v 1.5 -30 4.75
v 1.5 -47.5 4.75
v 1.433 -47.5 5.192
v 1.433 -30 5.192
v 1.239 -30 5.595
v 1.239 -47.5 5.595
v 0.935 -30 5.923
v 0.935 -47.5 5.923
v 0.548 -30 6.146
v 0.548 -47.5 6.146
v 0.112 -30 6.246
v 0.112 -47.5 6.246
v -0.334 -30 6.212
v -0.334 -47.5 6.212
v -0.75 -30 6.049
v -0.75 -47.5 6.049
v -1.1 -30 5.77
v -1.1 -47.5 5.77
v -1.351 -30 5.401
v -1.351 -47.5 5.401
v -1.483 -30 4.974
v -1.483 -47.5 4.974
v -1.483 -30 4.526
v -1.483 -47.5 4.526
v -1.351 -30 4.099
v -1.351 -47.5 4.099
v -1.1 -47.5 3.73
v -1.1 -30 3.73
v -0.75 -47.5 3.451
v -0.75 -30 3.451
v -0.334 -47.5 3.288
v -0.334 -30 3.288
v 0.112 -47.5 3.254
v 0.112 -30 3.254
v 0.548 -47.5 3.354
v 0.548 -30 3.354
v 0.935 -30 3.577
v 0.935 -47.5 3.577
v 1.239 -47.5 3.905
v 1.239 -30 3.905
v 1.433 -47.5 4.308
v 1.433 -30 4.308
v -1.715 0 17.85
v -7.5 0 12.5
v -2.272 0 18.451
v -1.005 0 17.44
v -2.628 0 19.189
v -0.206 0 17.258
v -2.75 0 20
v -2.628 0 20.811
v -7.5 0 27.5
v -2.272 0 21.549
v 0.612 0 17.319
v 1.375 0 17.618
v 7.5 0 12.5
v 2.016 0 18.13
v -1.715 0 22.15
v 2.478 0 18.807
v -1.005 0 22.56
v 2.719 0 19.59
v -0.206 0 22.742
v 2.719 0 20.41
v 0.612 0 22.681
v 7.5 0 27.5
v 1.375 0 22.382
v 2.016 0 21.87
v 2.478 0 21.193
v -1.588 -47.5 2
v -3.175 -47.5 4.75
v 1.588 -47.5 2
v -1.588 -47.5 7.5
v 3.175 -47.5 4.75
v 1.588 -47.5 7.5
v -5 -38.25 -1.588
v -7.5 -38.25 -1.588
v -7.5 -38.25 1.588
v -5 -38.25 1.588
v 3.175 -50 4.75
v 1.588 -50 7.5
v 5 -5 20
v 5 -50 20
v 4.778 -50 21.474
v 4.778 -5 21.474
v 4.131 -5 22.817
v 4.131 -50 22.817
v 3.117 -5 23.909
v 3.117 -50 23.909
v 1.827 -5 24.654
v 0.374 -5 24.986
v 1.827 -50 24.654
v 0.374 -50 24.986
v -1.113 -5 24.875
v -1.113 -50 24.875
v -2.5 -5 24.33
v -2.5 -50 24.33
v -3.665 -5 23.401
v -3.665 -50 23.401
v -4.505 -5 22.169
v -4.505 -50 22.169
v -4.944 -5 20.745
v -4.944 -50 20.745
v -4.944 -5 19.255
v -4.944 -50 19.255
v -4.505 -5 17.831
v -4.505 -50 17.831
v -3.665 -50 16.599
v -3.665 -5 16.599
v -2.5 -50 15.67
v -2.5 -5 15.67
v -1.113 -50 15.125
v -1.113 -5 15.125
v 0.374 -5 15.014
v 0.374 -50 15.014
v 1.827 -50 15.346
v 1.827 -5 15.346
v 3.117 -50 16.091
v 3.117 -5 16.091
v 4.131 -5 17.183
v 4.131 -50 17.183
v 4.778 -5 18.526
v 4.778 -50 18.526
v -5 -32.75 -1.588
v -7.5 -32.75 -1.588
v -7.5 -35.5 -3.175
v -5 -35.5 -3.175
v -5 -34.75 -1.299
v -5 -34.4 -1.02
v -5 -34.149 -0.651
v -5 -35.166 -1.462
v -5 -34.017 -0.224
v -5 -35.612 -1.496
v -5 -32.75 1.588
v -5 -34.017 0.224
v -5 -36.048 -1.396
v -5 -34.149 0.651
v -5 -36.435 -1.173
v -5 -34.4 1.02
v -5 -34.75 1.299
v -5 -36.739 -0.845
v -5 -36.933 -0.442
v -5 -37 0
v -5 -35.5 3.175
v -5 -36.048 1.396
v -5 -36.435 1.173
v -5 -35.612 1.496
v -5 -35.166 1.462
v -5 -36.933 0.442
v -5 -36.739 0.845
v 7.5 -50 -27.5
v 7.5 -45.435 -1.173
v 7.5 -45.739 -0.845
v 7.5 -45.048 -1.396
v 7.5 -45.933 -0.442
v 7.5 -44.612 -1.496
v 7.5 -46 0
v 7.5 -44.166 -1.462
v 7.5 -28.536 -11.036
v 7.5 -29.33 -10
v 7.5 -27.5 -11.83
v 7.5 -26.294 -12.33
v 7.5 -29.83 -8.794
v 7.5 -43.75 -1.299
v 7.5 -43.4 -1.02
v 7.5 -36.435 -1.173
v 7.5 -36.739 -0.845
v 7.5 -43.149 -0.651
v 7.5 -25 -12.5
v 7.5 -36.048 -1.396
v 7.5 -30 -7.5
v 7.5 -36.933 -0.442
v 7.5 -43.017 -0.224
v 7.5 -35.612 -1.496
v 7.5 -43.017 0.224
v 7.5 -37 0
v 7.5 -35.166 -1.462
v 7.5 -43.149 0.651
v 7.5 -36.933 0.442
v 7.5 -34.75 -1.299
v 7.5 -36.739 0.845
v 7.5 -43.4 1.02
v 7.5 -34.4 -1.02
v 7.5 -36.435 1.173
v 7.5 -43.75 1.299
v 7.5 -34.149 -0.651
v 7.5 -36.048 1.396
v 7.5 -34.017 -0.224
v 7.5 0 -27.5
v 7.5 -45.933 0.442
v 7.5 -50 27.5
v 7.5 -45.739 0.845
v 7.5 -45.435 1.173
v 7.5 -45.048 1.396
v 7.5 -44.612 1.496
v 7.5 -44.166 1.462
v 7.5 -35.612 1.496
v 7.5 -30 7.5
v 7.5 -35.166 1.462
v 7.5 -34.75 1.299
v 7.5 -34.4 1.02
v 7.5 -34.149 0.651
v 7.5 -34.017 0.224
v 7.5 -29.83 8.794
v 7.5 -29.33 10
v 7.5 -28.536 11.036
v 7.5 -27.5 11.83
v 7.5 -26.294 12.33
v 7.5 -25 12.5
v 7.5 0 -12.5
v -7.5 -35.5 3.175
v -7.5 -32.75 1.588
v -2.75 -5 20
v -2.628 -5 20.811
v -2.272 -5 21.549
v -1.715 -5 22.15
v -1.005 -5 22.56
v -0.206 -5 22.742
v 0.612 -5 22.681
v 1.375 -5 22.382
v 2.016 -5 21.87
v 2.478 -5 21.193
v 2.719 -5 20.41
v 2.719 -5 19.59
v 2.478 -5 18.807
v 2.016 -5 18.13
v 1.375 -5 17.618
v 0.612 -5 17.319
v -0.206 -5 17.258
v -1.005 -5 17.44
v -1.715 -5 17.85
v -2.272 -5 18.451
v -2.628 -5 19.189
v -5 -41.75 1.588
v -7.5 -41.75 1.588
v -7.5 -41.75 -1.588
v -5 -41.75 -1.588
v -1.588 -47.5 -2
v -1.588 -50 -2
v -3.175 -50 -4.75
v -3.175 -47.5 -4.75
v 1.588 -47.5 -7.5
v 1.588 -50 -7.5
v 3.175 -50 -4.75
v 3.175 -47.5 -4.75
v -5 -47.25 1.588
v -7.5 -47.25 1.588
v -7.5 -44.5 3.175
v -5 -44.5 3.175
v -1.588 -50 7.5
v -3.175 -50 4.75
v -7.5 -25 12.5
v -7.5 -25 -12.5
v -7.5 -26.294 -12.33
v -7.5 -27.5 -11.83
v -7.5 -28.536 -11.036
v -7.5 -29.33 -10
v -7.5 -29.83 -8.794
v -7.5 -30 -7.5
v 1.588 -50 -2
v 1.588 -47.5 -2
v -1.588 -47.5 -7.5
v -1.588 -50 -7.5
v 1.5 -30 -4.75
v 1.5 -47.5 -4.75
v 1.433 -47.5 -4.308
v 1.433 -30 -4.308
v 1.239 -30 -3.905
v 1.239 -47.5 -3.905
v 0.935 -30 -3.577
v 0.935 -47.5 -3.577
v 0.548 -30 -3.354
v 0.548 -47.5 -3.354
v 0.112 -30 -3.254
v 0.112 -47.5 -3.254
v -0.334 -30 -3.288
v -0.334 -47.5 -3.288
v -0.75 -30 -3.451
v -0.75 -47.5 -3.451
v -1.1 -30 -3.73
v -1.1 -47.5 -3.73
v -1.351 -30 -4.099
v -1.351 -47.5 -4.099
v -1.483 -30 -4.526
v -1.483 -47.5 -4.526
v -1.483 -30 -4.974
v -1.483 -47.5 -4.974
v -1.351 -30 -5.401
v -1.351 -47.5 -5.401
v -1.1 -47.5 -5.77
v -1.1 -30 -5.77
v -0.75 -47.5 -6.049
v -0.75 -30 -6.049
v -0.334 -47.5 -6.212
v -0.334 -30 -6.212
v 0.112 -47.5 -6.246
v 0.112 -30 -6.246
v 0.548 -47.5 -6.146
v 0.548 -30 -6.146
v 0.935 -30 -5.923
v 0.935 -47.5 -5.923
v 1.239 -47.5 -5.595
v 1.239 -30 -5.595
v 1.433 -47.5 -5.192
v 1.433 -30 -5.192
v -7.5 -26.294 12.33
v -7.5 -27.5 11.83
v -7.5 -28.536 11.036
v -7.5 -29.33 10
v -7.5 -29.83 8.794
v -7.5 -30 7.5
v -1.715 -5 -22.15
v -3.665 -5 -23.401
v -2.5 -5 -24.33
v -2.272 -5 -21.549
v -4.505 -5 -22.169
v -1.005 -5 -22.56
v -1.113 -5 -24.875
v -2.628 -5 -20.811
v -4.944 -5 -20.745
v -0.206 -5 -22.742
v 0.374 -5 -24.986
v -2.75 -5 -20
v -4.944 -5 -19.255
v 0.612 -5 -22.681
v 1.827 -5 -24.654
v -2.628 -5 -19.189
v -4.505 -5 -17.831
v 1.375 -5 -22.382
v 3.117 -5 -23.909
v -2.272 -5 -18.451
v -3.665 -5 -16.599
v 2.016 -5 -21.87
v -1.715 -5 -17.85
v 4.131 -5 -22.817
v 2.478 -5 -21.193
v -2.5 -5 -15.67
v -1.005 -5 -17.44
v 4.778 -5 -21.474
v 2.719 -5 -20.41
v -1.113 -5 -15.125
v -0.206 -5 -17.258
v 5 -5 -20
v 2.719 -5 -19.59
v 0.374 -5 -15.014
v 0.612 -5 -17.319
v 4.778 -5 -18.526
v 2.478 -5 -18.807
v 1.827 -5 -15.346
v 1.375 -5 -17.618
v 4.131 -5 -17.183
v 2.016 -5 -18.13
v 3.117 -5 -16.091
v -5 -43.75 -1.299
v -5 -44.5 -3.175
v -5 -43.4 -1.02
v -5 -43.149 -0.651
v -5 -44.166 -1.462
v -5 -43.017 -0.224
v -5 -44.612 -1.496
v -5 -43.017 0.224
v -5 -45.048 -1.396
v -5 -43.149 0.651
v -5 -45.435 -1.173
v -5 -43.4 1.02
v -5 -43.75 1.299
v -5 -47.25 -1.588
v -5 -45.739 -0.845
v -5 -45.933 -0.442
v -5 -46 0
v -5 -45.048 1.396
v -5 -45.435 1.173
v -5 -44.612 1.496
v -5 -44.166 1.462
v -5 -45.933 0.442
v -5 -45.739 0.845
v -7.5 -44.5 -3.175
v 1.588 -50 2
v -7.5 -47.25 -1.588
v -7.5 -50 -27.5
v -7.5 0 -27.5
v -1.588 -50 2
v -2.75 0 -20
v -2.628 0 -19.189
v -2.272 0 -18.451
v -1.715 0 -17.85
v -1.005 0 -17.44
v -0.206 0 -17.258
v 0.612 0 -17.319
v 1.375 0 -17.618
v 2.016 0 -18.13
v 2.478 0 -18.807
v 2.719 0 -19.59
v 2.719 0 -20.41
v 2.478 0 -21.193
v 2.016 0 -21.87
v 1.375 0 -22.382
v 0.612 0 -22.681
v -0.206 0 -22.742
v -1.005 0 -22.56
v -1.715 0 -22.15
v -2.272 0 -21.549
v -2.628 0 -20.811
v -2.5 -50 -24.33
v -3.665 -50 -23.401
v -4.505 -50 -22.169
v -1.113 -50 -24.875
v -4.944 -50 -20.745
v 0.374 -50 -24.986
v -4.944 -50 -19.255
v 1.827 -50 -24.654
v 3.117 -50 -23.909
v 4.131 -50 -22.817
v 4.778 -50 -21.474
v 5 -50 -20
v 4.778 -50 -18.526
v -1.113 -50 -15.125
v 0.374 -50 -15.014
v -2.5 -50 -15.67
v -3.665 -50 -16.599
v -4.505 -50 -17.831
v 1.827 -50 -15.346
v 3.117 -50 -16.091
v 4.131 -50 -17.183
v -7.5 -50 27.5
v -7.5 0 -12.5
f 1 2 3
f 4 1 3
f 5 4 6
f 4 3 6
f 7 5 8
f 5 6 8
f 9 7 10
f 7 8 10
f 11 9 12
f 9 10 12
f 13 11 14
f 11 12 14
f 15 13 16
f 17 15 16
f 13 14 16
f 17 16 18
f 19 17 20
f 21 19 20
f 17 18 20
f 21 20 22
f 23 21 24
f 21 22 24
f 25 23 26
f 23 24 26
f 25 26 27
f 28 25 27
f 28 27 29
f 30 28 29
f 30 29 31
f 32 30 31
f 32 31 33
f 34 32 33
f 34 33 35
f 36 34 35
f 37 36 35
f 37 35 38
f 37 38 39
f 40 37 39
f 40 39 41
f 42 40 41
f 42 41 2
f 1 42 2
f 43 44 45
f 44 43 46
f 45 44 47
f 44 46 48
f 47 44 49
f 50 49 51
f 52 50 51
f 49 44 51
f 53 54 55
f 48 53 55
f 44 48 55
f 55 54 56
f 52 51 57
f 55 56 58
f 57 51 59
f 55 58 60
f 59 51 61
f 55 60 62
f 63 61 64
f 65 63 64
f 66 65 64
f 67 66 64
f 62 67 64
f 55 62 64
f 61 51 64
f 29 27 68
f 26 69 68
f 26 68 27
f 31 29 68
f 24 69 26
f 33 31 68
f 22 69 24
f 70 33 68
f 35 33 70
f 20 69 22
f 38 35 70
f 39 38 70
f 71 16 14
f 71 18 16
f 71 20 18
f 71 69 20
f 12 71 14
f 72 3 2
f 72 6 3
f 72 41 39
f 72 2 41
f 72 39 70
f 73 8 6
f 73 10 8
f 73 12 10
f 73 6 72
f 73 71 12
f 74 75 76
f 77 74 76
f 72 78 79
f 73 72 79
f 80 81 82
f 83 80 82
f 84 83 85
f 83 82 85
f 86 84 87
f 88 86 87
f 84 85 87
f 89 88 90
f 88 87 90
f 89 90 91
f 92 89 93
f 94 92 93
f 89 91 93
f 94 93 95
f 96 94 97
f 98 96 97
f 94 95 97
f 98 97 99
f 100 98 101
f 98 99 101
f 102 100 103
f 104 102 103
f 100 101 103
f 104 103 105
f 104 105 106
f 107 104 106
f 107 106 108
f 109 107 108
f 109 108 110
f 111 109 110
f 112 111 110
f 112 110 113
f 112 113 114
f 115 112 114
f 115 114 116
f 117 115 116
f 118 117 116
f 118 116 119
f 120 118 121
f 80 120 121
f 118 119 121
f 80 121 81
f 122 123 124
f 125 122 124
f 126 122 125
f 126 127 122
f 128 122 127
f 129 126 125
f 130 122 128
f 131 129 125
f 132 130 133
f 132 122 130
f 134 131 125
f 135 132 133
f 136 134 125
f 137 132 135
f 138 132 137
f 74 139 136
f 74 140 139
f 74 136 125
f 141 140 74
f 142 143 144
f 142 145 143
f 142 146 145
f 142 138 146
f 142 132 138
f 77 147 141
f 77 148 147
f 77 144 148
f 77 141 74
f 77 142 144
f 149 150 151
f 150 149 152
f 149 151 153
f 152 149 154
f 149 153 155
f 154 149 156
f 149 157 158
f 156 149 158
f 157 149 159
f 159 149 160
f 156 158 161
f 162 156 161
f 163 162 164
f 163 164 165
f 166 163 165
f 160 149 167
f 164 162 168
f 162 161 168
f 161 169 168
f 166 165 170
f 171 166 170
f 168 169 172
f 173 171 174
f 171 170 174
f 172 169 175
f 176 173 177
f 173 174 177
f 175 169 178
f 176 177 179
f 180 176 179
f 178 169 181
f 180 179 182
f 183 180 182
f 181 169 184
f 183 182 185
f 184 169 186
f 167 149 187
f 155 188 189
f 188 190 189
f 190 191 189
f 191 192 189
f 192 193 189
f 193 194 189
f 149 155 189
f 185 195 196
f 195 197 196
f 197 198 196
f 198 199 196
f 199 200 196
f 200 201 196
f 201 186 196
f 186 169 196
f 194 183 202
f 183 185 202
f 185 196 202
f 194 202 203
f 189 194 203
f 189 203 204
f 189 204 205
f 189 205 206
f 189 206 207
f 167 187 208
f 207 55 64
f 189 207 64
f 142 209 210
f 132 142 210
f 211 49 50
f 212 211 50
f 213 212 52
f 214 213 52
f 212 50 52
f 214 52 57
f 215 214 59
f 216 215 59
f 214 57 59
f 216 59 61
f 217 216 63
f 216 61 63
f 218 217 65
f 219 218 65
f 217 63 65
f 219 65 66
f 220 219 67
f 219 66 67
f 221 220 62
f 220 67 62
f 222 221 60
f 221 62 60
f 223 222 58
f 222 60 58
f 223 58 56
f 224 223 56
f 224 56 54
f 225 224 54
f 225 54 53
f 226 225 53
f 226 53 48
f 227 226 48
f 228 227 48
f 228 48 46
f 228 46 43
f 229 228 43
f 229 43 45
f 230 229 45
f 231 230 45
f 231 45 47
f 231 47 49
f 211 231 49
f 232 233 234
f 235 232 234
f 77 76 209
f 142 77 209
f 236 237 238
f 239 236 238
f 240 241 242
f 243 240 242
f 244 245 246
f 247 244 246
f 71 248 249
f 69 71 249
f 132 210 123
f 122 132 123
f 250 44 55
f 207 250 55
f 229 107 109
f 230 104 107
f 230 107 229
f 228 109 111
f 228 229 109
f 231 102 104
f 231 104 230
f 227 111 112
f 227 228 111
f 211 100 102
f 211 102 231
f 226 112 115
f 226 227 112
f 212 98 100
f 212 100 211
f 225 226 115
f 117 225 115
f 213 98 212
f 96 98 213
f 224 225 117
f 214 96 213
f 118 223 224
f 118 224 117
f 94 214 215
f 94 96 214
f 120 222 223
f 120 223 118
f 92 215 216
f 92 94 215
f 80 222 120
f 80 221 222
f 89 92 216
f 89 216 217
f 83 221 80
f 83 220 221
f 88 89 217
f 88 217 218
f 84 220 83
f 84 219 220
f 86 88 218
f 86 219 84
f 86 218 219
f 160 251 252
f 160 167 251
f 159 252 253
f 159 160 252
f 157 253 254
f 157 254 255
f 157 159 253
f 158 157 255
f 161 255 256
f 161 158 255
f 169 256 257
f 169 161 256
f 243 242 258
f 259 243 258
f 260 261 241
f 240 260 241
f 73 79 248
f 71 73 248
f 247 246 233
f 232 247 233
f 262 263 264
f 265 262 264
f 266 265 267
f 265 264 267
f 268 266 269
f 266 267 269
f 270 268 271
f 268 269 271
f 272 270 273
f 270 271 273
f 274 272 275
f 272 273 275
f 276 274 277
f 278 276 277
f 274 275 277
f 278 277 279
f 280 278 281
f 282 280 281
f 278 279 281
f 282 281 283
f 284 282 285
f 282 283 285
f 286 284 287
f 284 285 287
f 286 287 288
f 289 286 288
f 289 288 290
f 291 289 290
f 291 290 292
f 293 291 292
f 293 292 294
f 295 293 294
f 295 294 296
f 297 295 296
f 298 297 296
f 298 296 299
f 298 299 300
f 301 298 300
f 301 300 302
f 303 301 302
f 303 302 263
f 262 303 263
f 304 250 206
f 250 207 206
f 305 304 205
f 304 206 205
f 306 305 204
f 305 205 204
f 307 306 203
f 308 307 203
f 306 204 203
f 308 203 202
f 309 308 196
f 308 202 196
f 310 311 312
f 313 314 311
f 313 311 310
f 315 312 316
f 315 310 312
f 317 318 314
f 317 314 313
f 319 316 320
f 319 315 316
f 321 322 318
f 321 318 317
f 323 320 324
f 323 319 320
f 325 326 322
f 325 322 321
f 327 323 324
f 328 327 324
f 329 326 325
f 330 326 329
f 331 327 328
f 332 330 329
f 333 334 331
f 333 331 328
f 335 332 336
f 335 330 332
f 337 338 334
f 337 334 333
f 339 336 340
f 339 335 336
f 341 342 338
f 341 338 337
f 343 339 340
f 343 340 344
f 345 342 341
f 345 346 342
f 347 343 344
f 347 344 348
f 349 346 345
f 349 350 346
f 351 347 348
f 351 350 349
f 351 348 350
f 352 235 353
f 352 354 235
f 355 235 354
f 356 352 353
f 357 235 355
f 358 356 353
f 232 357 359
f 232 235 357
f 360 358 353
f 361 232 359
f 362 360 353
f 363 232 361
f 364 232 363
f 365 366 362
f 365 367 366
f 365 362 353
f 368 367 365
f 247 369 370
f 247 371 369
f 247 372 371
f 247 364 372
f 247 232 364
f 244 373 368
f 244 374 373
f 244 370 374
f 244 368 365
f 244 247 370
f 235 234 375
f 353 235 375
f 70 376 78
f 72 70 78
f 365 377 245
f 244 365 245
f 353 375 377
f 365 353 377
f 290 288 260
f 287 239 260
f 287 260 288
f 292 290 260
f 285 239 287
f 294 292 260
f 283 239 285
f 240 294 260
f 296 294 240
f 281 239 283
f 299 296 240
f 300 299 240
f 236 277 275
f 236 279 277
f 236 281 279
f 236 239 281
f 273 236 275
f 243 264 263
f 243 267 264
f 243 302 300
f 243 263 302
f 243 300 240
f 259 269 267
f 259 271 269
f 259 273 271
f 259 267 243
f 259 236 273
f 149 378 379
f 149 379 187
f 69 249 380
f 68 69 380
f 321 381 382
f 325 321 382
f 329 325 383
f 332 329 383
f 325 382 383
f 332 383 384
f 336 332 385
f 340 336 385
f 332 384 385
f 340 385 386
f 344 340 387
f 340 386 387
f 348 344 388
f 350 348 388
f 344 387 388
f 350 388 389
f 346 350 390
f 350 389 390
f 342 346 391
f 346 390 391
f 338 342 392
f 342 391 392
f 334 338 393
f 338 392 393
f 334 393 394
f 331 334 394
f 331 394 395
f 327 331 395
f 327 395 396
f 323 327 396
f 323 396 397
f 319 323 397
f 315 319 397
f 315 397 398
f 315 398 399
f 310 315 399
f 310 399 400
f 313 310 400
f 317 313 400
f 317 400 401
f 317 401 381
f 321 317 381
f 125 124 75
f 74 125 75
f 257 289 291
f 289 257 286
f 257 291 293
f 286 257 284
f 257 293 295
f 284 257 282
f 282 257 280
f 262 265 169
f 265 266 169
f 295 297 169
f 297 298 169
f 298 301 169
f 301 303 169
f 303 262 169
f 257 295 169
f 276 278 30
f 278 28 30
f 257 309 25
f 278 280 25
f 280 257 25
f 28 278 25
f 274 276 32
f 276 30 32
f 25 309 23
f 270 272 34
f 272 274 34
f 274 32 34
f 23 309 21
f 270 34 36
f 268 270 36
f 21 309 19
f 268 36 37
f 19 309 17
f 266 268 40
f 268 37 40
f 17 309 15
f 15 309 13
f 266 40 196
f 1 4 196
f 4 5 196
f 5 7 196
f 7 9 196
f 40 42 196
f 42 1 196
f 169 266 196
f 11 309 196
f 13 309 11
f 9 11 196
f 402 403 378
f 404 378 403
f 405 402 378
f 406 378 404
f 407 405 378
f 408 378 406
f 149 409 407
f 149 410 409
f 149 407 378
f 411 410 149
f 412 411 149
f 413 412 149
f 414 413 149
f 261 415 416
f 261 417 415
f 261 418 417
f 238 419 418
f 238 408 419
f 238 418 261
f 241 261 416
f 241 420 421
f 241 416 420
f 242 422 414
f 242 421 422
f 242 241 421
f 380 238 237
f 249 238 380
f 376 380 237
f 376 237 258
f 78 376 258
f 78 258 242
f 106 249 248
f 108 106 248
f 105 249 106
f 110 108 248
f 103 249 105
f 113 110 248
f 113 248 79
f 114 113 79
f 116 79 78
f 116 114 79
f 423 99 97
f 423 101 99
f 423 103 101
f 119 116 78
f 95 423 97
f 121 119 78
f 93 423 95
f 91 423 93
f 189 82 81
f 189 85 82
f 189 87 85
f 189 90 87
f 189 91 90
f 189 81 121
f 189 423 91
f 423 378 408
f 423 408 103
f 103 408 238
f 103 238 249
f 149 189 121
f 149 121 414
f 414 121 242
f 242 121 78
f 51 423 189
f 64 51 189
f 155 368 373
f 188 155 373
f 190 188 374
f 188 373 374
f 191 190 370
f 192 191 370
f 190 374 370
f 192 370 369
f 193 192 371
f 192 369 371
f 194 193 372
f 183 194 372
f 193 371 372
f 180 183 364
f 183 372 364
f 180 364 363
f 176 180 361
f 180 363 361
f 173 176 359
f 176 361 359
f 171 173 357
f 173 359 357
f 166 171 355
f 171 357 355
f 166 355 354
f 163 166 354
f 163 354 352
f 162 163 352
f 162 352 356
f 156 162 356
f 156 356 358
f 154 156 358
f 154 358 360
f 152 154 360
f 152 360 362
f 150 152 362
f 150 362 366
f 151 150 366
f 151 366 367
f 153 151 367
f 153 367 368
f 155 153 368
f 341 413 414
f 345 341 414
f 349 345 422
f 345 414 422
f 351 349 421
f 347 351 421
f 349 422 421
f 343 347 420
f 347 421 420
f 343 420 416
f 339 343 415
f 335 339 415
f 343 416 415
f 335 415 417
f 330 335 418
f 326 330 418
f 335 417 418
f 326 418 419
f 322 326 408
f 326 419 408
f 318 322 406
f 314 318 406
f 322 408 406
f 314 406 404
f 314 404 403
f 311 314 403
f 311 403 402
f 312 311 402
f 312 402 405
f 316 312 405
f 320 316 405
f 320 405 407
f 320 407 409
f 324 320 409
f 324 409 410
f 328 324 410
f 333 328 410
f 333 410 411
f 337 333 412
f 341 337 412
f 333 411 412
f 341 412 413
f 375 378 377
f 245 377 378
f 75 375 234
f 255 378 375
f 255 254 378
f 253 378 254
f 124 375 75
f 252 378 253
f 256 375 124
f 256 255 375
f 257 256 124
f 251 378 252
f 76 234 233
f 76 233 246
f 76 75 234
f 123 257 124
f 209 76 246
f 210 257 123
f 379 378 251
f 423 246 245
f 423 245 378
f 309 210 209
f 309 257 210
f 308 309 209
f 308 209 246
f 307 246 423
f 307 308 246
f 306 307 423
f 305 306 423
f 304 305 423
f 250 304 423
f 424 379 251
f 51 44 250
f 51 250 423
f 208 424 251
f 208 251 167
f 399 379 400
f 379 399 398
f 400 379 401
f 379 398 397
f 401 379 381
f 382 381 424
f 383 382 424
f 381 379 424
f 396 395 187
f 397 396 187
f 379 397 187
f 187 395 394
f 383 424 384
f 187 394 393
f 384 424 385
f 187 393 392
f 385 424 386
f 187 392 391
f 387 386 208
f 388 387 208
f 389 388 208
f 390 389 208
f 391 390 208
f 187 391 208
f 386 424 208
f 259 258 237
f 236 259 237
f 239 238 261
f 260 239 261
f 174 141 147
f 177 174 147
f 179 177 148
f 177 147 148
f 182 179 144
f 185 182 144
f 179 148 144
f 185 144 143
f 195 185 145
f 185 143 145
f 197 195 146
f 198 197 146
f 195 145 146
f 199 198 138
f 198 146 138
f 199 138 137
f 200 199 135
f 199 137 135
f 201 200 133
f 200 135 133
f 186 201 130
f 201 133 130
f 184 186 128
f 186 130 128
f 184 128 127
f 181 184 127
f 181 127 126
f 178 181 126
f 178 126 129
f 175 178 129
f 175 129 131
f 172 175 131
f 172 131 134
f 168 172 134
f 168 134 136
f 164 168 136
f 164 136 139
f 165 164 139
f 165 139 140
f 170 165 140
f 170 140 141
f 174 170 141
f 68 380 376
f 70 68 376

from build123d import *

# Parameters (mm, degrees)
F0_W      = 15
F0_H      = 15
F1_DEPTH  = 50
F2_W      = 15
F2_H      = 55
F3_DEPTH  = 20
F4_R      = 2.75
F5_DEPTH  = 50.001
F6_R      = 5
F7_DEPTH  = 45
F9_DEPTH  = 2.5
F10_R     = 1.5
F11_DEPTH = 12.501
F13_DEPTH = 2.5
F14_R     = 1.5
F15_DEPTH = 25
F16_R     = 5


with BuildPart() as f1:
    # F0 (on Front) → F1 (new body)
    with BuildSketch(Plane.XZ):
        with Locations((0, 20)):
            Rectangle(F0_W, F0_H)
        with Locations((0, -20)):
            Rectangle(F0_W, F0_H)
    extrude(amount=F1_DEPTH)

    # F2 (on face) → F3 (join)
    with BuildSketch(Plane.XZ.offset(50)):
        Rectangle(F2_W, F2_H)
    extrude(amount=-F3_DEPTH)

    # F4 (on face) → F5 (cut, through all)
    with BuildSketch(Plane(origin=(0, 0, 0), x_dir=(-1, 0, 0), z_dir=(0, 1, 0))):
        with Locations((0, 20)):
            Circle(F4_R)
        with Locations((0, -20)):
            Circle(F4_R)
    extrude(amount=-F5_DEPTH, mode=Mode.SUBTRACT)

    # F6 (on face) → F7 (cut)
    with BuildSketch(Plane.XZ.offset(50)):
        with Locations((0, 20)):
            Circle(F6_R)
        with Locations((0, -20)):
            Circle(F6_R)
    extrude(amount=-F7_DEPTH, mode=Mode.SUBTRACT)

    # F8 (on face) → F9 (cut)
    with BuildSketch(Plane(origin=(-7.5, 0, 0), x_dir=(0, -1, 0), z_dir=(-1, 0, 0))):
        Polygon((35.5, -3.175426), (38.25, -1.587713), (38.25, 1.587713), (35.5, 3.175426), (32.75, 1.587713), (32.75, -1.587713), align=None)
        Polygon((47.25, 1.587713), (44.5, 3.175426), (41.75, 1.587713), (41.75, -1.587713), (44.5, -3.175426), (47.25, -1.587713), align=None)
    extrude(amount=-F9_DEPTH, mode=Mode.SUBTRACT)

    # F10 (on face) → F11 (cut, through all)
    with BuildSketch(Plane(origin=(-5, 0, 0), x_dir=(0, -1, 0), z_dir=(-1, 0, 0))):
        with Locations((35.5, 0)):
            Circle(F10_R)
        with Locations((44.5, 0)):
            Circle(F10_R)
    extrude(amount=-F11_DEPTH, mode=Mode.SUBTRACT)

    # F12 (on face) → F13 (cut)
    with BuildSketch(Plane.XZ.offset(50)):
        Polygon((1.587713, 2), (3.175426, 4.75), (1.587713, 7.5), (-1.587713, 7.5), (-3.175426, 4.75), (-1.587713, 2), align=None)
        Polygon((1.587713, -7.5), (3.175426, -4.75), (1.587713, -2), (-1.587713, -2), (-3.175426, -4.75), (-1.587713, -7.5), align=None)
    extrude(amount=-F13_DEPTH, mode=Mode.SUBTRACT)

    # F14 (on face) → F15 (cut)
    with BuildSketch(Plane.XZ.offset(47.5)):
        with Locations((0, 4.75)):
            Circle(F14_R)
        with Locations((0, -4.75)):
            Circle(F14_R)
    extrude(amount=-F15_DEPTH, mode=Mode.SUBTRACT)

    # F16
    f16_edges = [f1.edges().sort_by_distance(p)[0] for p in [
        (0, -30, 12.5),
        (0, -30, -12.5),
    ]]
    fillet(f16_edges, radius=F16_R)


solid = f1.part
